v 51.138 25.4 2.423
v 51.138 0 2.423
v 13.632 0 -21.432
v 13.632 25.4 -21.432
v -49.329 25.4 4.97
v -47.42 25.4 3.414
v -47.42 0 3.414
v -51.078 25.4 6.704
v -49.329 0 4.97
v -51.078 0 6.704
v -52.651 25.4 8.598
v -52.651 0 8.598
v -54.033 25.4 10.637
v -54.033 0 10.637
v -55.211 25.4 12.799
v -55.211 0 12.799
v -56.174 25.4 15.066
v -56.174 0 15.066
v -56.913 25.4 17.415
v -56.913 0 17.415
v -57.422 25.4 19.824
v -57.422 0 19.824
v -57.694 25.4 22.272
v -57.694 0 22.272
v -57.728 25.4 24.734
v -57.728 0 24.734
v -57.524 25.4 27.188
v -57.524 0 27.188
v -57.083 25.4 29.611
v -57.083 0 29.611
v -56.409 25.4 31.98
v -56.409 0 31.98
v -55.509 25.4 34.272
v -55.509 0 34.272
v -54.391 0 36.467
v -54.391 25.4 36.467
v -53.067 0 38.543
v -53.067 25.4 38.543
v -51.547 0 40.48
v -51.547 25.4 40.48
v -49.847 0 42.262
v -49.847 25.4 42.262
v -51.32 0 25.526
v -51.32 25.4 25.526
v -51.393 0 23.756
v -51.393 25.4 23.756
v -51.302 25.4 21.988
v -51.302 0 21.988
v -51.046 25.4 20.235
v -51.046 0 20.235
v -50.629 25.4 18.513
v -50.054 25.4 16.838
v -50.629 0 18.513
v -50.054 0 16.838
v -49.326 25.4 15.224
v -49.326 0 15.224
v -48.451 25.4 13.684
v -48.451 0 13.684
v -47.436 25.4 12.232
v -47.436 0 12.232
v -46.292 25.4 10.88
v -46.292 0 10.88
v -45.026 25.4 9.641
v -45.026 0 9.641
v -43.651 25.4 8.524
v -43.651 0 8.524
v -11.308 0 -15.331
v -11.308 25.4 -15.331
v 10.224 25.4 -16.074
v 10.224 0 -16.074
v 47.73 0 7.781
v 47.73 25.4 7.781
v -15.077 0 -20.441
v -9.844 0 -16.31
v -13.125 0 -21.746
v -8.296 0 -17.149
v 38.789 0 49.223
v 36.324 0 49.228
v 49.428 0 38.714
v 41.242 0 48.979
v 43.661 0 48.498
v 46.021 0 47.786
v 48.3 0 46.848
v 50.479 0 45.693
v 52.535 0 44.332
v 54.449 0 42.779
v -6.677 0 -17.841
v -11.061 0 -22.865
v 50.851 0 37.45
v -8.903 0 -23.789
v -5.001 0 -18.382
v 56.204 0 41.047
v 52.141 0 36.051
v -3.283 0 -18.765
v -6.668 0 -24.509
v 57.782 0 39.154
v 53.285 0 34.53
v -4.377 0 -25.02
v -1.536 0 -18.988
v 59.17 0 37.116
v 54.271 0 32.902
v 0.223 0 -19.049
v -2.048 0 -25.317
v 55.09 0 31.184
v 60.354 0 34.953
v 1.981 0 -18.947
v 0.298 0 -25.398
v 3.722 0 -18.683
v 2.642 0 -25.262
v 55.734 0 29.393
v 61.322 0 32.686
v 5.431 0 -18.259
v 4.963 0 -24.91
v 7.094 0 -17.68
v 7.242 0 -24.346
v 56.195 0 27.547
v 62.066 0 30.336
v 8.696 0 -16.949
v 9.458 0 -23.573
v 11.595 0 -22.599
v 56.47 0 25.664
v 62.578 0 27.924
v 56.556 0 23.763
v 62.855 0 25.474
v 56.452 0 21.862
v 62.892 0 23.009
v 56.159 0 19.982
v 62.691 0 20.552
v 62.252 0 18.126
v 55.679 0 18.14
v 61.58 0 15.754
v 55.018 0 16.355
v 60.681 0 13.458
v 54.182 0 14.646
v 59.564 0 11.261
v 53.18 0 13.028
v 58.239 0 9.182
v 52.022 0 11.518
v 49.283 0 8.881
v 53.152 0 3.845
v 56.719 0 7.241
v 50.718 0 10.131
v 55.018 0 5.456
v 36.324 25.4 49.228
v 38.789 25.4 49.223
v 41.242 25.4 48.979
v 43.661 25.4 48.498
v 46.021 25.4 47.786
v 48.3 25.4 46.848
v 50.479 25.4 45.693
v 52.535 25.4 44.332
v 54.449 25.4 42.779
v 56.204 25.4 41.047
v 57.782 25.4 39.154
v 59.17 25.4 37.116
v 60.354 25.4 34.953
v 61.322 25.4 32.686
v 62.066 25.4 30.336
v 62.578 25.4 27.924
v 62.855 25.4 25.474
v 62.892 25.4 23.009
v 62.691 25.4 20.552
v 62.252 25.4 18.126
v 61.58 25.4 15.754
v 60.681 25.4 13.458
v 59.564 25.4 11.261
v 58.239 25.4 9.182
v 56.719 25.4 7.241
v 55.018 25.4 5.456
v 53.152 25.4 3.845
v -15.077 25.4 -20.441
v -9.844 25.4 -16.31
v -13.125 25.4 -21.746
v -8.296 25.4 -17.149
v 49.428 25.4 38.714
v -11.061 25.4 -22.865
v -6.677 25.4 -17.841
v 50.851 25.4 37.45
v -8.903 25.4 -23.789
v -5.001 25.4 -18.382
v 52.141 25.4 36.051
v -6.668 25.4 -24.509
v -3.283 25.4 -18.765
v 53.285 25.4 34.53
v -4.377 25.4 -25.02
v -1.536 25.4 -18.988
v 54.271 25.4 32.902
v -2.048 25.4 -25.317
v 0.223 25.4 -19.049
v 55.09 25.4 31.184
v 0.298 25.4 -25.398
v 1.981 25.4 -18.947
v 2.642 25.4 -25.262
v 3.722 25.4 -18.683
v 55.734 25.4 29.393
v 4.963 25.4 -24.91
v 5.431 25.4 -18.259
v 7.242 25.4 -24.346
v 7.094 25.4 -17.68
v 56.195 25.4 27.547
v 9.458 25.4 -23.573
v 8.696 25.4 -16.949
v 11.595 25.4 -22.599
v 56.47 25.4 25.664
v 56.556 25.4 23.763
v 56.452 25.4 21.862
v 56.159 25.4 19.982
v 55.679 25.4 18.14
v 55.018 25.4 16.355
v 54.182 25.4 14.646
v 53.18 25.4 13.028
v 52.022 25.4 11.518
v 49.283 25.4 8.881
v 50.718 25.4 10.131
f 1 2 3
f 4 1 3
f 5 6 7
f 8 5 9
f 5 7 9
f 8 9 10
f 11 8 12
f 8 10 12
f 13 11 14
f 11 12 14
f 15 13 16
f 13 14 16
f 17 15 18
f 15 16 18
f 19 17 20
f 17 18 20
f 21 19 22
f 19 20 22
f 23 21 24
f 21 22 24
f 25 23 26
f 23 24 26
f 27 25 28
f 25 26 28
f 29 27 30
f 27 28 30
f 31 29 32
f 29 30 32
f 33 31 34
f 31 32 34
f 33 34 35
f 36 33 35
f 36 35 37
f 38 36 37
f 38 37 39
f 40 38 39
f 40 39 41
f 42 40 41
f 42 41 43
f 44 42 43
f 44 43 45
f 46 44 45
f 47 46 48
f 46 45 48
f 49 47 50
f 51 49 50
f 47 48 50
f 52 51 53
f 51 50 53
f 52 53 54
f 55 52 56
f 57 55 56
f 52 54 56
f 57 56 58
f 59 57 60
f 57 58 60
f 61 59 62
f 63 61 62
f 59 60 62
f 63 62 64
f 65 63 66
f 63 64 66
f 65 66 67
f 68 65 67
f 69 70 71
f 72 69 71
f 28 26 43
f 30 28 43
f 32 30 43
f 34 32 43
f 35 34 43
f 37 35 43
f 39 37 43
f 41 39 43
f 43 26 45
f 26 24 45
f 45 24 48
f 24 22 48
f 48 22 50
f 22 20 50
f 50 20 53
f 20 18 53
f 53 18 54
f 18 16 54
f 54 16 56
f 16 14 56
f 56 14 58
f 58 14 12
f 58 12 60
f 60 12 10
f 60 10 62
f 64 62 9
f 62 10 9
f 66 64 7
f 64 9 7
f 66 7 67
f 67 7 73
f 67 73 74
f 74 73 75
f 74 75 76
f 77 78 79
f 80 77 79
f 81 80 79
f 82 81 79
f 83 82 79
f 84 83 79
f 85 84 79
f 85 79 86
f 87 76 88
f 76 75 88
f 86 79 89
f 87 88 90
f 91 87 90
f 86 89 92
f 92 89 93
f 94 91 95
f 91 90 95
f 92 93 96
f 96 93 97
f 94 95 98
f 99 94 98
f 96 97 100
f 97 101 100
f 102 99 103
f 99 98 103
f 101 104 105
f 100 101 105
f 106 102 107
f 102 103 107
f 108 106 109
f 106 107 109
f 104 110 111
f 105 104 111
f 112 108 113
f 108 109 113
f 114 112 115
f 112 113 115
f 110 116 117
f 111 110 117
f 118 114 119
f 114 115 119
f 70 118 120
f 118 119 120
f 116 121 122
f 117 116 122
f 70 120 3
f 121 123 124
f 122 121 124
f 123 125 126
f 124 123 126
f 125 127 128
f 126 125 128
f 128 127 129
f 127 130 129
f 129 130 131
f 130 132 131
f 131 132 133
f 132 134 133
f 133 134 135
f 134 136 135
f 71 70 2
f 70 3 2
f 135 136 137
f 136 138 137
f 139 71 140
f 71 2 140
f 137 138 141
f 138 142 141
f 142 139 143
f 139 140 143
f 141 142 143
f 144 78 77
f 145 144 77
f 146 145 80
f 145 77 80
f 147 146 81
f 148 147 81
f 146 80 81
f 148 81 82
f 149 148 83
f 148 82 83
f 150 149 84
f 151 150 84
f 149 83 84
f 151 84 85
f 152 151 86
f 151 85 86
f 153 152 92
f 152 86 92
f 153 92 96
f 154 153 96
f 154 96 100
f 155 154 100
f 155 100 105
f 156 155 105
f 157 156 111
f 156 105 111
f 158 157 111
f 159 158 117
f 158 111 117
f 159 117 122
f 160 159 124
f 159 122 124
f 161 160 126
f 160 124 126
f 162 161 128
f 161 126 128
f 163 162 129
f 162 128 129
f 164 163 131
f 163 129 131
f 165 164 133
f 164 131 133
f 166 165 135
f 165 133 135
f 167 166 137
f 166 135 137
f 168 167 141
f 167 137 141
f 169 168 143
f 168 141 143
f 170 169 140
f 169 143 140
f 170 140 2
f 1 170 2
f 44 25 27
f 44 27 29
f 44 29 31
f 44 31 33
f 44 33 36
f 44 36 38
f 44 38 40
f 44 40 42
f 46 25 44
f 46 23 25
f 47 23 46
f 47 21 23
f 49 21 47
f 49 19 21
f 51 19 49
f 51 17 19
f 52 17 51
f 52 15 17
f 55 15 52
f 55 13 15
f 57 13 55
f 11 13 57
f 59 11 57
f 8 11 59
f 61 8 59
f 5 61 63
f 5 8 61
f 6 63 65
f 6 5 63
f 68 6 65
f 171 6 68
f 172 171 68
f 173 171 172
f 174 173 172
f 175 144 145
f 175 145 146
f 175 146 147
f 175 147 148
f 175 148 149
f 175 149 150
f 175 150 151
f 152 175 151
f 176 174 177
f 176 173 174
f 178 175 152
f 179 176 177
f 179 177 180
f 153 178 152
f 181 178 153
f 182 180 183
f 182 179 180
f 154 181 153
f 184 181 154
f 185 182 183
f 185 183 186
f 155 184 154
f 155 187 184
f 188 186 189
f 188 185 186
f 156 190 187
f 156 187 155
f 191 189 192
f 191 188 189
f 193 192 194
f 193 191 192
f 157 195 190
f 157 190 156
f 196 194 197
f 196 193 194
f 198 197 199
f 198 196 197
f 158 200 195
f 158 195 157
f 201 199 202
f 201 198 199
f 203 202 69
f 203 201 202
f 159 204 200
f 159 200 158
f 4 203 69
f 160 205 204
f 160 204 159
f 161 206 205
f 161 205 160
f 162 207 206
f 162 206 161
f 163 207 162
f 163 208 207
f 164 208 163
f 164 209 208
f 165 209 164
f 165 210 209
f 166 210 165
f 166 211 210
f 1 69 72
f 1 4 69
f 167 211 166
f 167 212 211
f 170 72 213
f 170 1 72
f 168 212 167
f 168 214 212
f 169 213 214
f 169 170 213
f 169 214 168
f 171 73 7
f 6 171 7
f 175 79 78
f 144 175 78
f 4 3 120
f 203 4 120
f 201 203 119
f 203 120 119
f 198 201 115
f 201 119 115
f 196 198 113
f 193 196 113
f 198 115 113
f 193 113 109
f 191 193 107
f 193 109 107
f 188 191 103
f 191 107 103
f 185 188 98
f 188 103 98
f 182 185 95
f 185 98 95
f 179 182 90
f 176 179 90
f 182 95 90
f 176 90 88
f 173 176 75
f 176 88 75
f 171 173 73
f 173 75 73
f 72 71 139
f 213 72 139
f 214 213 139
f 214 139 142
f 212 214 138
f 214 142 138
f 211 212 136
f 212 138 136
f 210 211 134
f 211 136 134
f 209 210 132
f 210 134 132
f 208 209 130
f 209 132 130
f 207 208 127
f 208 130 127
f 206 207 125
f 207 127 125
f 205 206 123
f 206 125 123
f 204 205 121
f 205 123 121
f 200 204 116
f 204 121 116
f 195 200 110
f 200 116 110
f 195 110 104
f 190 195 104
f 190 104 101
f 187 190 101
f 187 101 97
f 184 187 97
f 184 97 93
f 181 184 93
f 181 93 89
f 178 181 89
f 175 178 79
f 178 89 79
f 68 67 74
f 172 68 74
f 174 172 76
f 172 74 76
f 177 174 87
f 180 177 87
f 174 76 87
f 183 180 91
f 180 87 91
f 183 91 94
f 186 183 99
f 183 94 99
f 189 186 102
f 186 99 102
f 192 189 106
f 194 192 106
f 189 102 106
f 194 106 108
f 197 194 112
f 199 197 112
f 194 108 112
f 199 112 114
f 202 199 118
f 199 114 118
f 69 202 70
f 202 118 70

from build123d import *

# Parameters (mm, degrees)
BOSS_EXTRUDE1_DEPTH = 25.4


with BuildPart() as part:
    # Sketch1 → Boss-Extrude1 (new body)
    with BuildSketch(Plane(origin=(0, 0, 0), x_dir=(1, 0, 0), z_dir=(0, 1, 0))):
        with BuildLine():
            ThreePointArc((-11.307534998, 15.331084511), (-0.657073574, 19.03866472), (10.223658013, 16.074181685))
            Line((10.223658013, 16.074181685), (47.730081944, -7.781020346))
            ThreePointArc((47.730081944, -7.781020346), (56.527791269, -22.811130875), (49.427965792, -38.713847313))
            Line((49.427965792, -38.713847313), (36.32387238, -49.227658983))
            ThreePointArc((36.32387238, -49.227658983), (61.722416996, -31.519775069), (51.137967948, -2.422959784))
            Line((51.137967948, -2.422959784), (13.631544017, 21.432242246))
            ThreePointArc((13.631544017, 21.432242246), (-0.876098099, 25.384886293), (-15.07671333, 20.441446014))
            Line((-15.07671333, 20.441446014), (-47.420289399, -3.413756016))
            ThreePointArc((-47.420289399, -3.413756016), (-57.694182826, -22.271934185), (-49.846542995, -42.261889641))
            Line((-49.846542995, -42.261889641), (-51.320154567, -25.526120494))
            ThreePointArc((-51.320154567, -25.526120494), (-49.708739726, -16.022348708), (-43.651111067, -8.52411752))
            Line((-43.651111067, -8.52411752), (-11.307534998, 15.331084511))
        make_face()
    extrude(amount=BOSS_EXTRUDE1_DEPTH)


solid = part.part
